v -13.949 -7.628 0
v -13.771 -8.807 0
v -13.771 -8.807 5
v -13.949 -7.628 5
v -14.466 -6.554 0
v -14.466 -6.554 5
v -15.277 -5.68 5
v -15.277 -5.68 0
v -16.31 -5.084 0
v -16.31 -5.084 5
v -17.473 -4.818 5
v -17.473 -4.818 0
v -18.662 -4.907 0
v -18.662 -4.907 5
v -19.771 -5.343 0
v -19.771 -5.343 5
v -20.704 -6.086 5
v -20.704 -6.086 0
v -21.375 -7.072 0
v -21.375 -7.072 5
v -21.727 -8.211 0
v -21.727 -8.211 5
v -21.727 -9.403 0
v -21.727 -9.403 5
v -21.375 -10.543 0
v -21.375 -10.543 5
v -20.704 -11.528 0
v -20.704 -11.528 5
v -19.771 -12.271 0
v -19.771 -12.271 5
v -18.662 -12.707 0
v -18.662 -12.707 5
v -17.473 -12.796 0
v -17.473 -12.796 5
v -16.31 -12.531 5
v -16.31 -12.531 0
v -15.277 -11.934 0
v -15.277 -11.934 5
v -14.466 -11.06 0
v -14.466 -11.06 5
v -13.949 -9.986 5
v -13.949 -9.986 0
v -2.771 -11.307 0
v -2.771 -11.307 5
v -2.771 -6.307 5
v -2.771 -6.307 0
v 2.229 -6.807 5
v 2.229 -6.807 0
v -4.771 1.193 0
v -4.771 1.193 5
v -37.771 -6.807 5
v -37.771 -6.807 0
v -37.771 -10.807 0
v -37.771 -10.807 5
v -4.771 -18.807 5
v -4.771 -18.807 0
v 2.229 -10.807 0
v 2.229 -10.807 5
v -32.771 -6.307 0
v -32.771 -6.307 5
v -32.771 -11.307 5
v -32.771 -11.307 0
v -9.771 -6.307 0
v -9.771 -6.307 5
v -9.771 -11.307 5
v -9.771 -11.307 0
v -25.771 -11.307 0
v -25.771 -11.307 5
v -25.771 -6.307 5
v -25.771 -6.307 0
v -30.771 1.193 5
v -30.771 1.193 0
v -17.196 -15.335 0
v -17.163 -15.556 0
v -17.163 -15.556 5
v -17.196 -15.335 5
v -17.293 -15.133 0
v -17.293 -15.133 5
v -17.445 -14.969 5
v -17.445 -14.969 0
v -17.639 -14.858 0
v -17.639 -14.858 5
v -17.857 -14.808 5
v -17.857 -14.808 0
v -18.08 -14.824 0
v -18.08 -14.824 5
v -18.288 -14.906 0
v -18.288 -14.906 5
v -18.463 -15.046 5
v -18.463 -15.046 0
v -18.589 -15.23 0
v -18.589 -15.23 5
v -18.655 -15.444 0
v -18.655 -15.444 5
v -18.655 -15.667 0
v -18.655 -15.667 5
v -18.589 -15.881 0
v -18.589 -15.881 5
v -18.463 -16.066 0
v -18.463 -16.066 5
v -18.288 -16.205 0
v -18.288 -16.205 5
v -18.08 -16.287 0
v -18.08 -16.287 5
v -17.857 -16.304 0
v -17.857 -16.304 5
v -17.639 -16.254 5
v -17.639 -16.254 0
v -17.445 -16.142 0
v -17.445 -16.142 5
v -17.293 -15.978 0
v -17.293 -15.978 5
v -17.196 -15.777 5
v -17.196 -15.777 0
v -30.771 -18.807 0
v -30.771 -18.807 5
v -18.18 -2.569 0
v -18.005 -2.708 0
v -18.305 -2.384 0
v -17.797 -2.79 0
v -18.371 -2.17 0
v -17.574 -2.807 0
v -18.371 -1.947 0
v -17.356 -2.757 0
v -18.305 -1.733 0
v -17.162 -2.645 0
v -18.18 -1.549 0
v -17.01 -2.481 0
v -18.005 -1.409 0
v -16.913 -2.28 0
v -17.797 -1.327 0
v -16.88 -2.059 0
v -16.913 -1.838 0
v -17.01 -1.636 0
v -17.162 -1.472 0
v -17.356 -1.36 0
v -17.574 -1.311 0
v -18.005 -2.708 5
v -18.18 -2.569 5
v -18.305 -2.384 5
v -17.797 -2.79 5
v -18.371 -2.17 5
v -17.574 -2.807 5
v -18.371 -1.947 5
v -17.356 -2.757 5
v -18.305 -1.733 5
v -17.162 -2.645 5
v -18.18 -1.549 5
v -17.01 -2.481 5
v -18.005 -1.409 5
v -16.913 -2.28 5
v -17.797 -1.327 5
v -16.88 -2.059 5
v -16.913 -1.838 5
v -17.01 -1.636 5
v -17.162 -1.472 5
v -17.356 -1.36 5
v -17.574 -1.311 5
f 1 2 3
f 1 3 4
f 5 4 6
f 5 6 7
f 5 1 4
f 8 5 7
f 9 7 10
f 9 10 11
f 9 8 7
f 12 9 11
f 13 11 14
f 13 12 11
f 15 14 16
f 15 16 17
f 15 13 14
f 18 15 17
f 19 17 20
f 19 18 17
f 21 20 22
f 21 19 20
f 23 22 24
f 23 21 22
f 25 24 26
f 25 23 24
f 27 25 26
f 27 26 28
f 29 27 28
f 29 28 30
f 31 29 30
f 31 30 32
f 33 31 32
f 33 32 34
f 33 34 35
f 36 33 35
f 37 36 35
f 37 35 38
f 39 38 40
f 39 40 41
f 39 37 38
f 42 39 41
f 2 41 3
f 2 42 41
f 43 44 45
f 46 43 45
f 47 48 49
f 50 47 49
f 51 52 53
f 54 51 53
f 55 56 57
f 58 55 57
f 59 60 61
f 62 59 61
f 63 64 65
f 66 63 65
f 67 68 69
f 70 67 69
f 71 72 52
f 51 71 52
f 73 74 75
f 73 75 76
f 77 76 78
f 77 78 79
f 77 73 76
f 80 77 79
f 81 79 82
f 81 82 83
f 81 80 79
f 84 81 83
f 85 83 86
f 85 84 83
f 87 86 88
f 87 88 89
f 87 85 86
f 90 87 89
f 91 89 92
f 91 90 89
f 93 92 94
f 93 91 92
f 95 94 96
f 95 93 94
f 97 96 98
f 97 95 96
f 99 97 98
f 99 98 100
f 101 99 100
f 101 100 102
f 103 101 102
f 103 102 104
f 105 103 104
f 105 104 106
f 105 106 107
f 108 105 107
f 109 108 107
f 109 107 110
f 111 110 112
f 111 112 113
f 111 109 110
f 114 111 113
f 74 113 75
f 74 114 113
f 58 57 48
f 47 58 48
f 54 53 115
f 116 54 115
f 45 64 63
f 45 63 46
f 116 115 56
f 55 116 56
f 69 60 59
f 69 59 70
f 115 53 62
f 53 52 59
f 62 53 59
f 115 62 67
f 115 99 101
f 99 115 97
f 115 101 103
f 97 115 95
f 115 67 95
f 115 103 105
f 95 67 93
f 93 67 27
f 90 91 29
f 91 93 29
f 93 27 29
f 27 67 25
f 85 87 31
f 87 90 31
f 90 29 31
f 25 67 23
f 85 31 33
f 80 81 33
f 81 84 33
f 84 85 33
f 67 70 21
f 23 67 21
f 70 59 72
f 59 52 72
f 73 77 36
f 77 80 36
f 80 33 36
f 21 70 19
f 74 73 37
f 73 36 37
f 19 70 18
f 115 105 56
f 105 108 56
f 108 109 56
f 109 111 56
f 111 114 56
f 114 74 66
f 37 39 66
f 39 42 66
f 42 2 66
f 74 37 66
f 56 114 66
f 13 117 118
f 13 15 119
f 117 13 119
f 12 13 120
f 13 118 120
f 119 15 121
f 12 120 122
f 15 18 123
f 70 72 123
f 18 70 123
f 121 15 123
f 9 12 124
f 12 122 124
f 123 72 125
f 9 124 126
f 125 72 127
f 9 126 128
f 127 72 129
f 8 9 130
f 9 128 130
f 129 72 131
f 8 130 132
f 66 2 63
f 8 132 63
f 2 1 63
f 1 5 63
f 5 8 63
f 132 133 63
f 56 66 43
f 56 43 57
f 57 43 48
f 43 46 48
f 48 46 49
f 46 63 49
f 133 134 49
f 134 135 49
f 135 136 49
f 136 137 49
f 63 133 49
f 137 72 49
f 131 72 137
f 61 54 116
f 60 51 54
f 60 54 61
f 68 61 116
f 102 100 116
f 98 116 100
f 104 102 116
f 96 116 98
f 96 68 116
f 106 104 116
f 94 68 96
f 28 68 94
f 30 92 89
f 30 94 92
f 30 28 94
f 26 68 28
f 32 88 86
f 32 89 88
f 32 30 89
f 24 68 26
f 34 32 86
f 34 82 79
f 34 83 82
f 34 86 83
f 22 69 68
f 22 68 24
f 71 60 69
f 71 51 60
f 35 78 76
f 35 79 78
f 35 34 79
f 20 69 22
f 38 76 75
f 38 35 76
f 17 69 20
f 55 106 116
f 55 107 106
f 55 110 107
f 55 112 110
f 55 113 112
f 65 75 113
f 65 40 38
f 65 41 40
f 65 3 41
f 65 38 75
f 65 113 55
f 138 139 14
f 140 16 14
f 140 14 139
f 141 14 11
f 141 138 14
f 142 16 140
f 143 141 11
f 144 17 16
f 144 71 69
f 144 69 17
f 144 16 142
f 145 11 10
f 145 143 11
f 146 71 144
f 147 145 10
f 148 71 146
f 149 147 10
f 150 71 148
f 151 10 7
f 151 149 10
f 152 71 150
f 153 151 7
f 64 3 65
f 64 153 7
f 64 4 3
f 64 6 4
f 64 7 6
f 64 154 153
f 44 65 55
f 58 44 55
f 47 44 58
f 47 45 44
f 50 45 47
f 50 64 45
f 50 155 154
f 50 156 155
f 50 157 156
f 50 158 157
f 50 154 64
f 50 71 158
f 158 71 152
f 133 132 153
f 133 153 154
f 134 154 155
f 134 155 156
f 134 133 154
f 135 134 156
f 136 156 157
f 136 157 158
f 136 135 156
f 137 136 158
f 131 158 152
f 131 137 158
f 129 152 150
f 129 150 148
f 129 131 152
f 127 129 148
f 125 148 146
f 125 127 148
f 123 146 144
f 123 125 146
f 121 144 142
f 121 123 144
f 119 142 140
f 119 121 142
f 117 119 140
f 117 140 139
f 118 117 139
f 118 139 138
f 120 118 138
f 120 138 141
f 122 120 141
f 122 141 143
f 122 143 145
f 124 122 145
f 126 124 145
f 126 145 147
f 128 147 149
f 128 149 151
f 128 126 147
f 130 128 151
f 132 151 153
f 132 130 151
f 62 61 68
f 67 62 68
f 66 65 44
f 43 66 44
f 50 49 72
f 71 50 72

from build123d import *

# Parameters (mm, degrees)
SKETCH1_R               = 4
SKETCH1_R_2             = 0.75
BOSS_EXTRUDE1_DEPTH     = 5
CUT_EXTRUDE1_DEPTH      = 5
CUT_EXTRUDE1_DEPTH_BACK = 5
SKETCH2_W               = 7
SKETCH2_H               = 5


with BuildPart() as part:
    # Sketch1 → Boss-Extrude1 (new body)
    with BuildSketch(Plane.XY):
        Polygon((-30.771428571, -18.807142857), (-4.771428571, -18.807142857), (2.228571429, -10.807142857), (2.228571429, -6.807142857), (-4.771428571, 1.192857143), (-30.771428571, 1.192857143), (-37.771428571, -6.807142857), (-37.771428571, -10.807142857), align=None)
        with Locations((-17.771428571, -8.807142857)):
            Circle(SKETCH1_R, mode=Mode.SUBTRACT)
        with Locations((-17.629745485, -2.058630135)):
            Circle(SKETCH1_R_2, mode=Mode.SUBTRACT)
        with Locations((-17.913111664, -15.555655867)):
            Circle(SKETCH1_R_2, mode=Mode.SUBTRACT)
    extrude(amount=BOSS_EXTRUDE1_DEPTH)

    # Sketch2 → Cut-Extrude1 (cut, two sides: drawn at the far end of the back side and taken through both)
    with BuildSketch(Plane.XY.offset(5).offset(-CUT_EXTRUDE1_DEPTH_BACK)):
        with Locations((-29.271428571, -8.807142857)):
            Rectangle(SKETCH2_W, SKETCH2_H)
        with Locations((-6.271428571, -8.807142857)):
            Rectangle(SKETCH2_W, SKETCH2_H)
    extrude(amount=CUT_EXTRUDE1_DEPTH + CUT_EXTRUDE1_DEPTH_BACK, mode=Mode.SUBTRACT)


solid = part.part
